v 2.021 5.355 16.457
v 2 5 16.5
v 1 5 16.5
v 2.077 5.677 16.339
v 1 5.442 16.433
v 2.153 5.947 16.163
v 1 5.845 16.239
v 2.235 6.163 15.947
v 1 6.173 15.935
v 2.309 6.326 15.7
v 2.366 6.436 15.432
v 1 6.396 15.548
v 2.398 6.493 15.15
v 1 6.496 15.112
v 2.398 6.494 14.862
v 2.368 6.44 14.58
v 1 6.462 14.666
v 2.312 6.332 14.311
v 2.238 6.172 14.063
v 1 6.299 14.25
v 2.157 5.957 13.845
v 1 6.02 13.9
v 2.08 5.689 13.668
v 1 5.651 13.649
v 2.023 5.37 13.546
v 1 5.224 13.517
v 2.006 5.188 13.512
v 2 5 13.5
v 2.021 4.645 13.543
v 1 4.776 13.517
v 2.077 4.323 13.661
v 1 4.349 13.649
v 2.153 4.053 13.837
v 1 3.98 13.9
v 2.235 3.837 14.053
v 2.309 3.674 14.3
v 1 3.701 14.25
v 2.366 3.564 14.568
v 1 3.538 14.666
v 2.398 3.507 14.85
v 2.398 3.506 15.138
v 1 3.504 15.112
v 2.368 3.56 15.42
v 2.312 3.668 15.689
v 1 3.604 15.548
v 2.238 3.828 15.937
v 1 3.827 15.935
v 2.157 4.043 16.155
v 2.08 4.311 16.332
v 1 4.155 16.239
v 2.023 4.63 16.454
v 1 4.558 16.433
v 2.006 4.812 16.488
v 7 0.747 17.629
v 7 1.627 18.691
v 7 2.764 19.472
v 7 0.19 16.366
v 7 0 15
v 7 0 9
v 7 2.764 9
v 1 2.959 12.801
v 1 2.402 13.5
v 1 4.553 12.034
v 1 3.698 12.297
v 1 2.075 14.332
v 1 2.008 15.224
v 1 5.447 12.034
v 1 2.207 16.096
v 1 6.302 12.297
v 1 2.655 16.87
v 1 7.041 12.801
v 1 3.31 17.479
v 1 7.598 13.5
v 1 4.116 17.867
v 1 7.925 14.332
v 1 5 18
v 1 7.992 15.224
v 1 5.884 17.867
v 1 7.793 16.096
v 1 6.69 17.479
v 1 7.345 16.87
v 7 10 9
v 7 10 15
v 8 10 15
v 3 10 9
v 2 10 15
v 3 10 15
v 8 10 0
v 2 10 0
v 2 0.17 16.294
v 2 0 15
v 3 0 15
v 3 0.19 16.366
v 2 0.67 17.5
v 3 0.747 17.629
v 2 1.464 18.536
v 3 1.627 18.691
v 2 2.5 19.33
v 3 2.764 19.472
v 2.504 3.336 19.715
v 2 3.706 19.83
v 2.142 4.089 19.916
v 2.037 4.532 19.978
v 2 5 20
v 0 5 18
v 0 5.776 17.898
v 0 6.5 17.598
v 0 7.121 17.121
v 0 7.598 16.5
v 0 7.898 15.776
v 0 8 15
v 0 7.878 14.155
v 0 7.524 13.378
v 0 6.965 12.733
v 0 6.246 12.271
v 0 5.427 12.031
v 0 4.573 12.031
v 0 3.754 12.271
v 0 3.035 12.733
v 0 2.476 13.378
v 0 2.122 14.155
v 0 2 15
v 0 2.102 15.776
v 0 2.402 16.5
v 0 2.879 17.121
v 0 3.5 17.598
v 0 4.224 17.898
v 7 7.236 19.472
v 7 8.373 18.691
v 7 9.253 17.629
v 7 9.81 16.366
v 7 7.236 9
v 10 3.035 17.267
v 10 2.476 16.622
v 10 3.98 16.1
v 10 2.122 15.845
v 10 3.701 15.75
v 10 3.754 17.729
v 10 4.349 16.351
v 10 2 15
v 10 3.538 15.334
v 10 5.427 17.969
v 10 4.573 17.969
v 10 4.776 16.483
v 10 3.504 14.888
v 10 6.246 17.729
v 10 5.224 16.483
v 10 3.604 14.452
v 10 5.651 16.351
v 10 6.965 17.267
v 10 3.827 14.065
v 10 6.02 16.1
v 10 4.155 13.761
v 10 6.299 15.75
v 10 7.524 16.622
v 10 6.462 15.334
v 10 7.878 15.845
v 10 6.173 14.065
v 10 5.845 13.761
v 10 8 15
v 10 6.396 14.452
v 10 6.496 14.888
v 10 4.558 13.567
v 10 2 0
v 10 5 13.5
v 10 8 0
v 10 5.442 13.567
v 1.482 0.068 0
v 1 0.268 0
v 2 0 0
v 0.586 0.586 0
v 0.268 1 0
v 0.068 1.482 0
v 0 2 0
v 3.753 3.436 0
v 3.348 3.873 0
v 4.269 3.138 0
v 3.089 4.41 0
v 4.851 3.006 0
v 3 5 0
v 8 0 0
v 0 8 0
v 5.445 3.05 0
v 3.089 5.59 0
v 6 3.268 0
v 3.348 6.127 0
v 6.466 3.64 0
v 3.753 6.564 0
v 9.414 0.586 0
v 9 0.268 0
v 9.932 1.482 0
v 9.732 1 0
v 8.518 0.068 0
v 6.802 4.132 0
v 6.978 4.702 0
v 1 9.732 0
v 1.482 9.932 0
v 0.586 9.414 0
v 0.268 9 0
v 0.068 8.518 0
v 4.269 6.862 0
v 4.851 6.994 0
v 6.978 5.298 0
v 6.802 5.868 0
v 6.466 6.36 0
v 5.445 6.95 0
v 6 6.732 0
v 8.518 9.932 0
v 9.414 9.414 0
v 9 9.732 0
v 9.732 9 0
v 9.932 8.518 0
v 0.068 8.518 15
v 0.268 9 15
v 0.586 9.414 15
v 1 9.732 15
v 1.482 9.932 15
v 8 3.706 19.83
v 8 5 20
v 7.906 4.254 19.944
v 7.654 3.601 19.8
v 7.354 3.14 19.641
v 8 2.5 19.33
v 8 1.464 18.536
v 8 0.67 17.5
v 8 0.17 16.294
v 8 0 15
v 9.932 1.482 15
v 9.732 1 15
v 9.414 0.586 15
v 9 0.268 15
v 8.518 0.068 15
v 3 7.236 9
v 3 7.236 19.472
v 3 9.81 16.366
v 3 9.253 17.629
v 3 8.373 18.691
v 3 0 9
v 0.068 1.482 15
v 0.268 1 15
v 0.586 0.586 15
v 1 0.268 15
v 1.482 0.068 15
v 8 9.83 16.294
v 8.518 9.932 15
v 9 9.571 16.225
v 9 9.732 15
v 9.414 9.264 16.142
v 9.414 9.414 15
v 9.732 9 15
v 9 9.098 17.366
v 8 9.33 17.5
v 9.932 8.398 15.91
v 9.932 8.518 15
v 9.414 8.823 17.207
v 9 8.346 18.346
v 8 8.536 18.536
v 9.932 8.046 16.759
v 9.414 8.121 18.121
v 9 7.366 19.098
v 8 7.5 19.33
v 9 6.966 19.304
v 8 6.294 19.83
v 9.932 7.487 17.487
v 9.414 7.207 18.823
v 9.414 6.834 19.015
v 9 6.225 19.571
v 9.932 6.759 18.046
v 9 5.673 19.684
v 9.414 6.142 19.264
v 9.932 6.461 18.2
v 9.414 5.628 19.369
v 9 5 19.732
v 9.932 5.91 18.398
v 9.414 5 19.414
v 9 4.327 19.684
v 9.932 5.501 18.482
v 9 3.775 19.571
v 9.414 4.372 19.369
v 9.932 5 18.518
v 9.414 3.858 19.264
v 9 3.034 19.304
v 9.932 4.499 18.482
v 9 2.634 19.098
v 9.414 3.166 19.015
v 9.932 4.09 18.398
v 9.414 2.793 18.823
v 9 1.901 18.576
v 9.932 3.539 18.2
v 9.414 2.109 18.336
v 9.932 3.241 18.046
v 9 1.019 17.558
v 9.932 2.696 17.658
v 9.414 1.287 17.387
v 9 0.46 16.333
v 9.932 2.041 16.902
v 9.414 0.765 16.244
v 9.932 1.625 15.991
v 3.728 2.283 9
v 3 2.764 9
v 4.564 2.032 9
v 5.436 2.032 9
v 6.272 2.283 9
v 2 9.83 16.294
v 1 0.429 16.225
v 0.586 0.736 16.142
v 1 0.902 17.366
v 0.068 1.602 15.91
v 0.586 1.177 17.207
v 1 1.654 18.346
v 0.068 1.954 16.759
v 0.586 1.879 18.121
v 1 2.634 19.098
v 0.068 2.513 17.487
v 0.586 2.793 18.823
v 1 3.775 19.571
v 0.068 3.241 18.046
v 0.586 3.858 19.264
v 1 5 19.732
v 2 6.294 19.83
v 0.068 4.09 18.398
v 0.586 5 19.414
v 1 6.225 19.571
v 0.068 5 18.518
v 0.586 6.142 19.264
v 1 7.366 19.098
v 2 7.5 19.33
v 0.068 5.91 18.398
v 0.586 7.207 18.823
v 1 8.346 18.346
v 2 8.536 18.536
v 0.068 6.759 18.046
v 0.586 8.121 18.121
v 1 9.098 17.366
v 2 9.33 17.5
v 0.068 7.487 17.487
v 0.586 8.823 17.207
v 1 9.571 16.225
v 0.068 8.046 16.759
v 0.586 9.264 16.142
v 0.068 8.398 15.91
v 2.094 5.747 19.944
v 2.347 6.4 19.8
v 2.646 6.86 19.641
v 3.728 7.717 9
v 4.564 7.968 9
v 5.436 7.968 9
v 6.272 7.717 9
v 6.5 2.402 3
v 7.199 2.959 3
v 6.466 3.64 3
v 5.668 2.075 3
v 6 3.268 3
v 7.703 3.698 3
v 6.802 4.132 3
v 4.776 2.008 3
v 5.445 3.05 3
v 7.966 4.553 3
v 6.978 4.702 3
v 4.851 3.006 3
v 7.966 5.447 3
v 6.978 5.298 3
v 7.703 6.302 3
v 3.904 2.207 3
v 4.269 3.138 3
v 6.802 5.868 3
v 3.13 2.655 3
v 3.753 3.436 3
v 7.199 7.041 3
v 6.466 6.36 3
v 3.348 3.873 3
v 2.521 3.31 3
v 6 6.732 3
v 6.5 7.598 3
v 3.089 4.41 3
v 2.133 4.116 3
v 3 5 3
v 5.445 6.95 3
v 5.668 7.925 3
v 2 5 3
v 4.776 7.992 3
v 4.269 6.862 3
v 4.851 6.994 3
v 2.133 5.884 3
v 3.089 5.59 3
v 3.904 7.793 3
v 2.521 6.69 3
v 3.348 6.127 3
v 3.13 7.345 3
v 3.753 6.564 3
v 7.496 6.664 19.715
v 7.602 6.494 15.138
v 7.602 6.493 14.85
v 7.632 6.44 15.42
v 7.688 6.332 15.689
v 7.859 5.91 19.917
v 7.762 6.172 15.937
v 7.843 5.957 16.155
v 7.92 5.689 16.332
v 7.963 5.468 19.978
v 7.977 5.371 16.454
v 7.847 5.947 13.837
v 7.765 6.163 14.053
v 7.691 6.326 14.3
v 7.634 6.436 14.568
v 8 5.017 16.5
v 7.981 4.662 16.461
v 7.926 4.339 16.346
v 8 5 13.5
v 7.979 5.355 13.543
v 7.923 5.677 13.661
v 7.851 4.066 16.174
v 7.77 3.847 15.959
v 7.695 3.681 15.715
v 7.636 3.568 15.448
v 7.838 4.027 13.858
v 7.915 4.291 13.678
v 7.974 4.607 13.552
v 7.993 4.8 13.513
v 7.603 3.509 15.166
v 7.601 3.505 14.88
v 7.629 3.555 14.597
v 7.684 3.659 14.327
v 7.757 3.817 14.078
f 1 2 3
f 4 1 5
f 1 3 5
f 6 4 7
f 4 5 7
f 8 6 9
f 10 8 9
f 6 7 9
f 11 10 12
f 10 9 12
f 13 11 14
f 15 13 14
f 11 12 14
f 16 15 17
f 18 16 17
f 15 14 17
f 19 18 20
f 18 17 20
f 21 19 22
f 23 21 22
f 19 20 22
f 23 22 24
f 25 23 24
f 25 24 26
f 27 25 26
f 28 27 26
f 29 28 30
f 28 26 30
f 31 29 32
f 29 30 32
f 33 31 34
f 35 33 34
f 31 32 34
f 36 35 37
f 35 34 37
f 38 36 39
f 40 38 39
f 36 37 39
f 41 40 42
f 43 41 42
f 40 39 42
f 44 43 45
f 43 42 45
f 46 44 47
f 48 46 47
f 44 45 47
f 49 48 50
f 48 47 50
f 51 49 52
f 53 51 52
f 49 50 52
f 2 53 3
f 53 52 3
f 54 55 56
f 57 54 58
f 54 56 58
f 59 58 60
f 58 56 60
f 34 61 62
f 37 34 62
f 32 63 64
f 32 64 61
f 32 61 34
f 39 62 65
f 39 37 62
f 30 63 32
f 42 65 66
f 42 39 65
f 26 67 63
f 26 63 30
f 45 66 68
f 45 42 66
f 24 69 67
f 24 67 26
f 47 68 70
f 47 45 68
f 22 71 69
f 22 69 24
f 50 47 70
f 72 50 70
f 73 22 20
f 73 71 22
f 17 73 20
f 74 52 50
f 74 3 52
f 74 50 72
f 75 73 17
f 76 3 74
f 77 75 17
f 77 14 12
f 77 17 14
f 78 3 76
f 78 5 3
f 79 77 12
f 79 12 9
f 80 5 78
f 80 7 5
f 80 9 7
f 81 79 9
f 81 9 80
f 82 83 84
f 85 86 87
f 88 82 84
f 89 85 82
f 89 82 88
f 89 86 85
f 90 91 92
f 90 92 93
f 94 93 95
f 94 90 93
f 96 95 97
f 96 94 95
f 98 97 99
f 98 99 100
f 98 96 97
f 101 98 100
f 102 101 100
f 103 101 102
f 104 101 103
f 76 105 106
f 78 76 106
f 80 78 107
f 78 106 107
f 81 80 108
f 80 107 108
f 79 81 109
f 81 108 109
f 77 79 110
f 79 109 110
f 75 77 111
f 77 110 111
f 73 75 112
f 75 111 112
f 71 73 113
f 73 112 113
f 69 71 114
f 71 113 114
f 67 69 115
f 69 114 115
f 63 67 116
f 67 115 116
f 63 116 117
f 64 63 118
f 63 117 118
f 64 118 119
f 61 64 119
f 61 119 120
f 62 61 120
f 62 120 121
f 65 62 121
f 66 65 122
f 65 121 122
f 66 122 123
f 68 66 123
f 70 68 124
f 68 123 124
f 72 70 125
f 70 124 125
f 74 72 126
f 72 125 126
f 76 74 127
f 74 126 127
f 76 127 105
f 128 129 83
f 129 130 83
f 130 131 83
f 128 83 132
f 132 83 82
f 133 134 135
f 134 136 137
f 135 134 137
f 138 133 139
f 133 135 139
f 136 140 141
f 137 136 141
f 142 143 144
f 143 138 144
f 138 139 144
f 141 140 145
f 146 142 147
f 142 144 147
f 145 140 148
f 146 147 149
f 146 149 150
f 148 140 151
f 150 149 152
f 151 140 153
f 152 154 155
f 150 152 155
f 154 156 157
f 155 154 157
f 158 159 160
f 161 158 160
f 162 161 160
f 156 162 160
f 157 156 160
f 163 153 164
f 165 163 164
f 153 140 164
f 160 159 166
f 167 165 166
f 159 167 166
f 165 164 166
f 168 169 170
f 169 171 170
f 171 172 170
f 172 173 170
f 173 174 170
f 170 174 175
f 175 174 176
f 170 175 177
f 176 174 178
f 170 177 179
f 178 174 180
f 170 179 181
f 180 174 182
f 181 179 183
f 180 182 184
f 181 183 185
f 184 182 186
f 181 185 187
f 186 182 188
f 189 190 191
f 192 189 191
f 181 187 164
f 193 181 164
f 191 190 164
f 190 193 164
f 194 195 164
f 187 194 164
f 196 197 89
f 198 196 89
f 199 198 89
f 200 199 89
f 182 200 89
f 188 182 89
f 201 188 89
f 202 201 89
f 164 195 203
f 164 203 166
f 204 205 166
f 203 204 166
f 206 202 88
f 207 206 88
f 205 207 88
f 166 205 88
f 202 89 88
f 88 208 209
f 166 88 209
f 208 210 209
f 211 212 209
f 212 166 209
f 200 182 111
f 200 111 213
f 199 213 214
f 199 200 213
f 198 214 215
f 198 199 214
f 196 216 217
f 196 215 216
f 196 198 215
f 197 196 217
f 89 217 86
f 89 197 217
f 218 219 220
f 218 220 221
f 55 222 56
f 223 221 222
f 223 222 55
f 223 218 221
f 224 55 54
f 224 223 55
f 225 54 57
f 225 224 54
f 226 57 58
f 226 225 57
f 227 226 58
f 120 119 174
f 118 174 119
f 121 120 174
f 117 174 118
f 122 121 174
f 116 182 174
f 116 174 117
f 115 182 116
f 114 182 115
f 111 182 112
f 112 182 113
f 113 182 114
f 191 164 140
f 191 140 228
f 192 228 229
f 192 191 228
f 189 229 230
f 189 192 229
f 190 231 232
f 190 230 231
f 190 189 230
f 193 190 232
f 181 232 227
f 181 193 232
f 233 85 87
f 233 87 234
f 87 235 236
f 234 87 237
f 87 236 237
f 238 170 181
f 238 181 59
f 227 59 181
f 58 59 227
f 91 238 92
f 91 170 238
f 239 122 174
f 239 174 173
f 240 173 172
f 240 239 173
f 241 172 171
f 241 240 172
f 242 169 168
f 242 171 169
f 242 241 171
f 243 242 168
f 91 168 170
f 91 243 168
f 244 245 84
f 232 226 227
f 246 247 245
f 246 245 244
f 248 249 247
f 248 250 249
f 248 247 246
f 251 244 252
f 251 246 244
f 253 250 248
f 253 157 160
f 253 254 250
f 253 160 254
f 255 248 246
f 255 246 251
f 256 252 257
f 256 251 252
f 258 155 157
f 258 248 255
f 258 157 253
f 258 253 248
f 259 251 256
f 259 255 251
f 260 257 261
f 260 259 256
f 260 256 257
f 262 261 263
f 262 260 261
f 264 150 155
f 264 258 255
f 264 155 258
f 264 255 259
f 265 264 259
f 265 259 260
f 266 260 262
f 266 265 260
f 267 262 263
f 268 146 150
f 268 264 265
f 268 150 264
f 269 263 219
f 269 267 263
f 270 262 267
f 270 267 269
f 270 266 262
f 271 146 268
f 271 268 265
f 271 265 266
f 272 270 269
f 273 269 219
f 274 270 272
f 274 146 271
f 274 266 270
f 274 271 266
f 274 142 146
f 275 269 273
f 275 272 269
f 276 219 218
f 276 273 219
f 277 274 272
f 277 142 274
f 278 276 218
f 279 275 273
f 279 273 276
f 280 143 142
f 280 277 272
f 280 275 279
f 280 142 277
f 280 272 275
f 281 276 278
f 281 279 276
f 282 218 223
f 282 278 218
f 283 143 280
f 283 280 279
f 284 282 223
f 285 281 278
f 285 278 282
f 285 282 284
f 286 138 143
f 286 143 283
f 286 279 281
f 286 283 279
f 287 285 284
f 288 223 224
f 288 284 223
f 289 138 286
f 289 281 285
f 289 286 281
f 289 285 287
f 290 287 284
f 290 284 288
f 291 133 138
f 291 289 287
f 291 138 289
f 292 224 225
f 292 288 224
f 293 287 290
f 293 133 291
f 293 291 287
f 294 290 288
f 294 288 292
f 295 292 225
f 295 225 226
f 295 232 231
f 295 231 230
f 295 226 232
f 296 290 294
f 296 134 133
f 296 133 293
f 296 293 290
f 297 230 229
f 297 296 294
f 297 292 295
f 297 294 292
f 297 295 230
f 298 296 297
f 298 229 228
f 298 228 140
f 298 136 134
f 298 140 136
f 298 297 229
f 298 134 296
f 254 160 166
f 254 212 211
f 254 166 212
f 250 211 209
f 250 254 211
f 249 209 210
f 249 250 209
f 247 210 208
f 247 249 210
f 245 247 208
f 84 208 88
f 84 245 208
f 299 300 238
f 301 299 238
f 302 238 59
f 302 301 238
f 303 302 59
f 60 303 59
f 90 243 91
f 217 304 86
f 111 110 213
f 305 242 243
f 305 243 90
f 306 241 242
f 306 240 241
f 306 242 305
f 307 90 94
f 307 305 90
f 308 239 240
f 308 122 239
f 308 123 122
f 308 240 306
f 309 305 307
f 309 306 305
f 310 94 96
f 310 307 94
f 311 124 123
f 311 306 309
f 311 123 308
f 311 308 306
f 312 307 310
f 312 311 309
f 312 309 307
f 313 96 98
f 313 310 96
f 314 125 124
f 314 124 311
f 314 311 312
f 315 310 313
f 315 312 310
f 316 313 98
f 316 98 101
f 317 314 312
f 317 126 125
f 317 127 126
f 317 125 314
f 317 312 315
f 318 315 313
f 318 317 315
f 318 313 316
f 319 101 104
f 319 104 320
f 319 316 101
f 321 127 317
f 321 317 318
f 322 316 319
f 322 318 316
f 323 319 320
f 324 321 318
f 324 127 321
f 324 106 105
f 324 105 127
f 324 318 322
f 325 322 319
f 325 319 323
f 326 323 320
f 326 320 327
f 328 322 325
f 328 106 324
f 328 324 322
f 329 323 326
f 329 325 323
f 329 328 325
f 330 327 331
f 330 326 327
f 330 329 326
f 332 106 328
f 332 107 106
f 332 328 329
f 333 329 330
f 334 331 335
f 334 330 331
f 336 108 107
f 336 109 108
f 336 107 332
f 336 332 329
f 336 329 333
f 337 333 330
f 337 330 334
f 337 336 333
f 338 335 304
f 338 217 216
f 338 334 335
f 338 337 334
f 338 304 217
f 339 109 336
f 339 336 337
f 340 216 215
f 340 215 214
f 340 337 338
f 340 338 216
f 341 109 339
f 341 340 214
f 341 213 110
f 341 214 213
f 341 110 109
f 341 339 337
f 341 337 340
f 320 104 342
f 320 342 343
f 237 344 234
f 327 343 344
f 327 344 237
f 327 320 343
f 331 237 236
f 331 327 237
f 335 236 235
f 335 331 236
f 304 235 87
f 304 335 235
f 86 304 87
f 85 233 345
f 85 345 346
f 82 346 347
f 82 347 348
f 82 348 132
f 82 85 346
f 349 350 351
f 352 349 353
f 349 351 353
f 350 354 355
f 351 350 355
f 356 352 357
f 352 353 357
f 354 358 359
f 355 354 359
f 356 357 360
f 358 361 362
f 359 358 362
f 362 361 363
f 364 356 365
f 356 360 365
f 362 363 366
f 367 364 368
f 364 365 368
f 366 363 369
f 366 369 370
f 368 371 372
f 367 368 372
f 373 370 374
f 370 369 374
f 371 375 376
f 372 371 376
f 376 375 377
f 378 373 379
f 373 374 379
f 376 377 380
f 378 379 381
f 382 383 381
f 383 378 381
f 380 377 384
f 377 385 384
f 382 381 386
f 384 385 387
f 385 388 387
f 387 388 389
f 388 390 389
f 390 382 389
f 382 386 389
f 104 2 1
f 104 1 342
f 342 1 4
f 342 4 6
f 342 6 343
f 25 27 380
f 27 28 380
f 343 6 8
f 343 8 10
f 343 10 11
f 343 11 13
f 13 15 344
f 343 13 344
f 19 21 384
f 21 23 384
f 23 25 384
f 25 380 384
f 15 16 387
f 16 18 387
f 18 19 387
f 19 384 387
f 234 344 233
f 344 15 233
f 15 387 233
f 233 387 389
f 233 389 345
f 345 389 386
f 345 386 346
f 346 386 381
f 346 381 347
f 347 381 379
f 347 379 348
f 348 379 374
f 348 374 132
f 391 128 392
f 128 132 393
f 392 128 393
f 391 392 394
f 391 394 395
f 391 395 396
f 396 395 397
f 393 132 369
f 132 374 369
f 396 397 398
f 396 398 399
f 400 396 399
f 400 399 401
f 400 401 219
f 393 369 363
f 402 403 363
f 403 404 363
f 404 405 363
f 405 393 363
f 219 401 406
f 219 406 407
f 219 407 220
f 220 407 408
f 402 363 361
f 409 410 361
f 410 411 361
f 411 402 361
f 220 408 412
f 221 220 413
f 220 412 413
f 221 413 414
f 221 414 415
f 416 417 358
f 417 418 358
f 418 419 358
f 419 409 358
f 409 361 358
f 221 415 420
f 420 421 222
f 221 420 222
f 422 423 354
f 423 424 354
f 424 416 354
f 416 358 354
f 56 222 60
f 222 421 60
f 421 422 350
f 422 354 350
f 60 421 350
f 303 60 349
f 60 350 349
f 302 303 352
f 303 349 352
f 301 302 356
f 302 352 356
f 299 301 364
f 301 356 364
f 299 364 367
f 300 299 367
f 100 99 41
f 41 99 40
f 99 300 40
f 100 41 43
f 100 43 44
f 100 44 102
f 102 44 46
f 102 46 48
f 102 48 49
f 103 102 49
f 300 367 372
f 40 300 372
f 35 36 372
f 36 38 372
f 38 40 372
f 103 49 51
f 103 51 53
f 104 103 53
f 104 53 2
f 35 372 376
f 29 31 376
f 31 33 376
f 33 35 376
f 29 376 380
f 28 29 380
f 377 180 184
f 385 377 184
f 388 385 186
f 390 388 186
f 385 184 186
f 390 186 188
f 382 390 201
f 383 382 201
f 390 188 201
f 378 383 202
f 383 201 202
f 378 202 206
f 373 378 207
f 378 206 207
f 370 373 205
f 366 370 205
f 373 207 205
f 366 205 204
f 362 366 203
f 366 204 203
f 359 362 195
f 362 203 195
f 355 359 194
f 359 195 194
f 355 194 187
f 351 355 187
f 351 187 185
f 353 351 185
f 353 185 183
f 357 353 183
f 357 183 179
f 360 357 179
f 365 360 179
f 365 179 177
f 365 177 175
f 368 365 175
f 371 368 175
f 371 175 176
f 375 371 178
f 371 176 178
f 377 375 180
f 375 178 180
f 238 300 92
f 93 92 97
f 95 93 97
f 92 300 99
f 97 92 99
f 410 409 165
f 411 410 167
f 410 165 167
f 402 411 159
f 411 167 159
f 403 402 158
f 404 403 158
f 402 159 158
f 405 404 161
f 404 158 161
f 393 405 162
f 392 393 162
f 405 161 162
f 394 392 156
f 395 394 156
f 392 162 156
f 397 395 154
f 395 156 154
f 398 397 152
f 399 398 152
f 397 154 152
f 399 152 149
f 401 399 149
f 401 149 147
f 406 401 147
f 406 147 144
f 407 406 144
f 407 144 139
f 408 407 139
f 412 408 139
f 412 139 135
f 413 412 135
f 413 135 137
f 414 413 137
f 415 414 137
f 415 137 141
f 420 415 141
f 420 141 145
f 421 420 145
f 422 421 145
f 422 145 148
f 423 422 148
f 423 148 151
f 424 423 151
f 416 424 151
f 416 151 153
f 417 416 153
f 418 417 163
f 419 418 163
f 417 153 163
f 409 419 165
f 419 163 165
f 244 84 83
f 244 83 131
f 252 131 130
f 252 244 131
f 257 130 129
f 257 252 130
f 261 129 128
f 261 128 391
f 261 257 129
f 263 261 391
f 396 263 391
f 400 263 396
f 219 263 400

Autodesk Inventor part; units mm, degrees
ref_plane "YZ Plane" through (0, 0, 0) normal (1, 0, 0) x (0, 1, 0)
ref_plane "XZ Plane" through (0, 0, 0) normal (0, 1, 0) x (-1, 0, 0)
sketch "Sketch1" plane through (0, 0, 0) normal (0, 0, 1) x (1, 0, 0)
  line L0 (0, 0) -> (10, 0)
  line L1 (10, 0) -> (10, 10)
  line L2 (10, 10) -> (0, 10)
  line L3 (0, 10) -> (0, 0)
  dimension "d0" = 10
  dimension "d1" = 10
extrude "Extrusion1" add sketch "Sketch1" along normal blind 9
sketch "Sketch2" plane through (10, 0, 0) normal (1, 0, 0) x (0, 0, -1)
  circle A0 centre (-15, 5) radius 5 construction
  line L0 (0, 0) -> (0, 10) projected
  arc A1 (-15, 10) -> (-15, 0) centre (-15, 5) ccw
  line L1 (-9, 0) -> (-9, 10) projected
  line L2 (-15, 10) -> (-9, 10)
  line L3 (-15, 0) -> (-9, 0)
  circle A2 centre (-15, 5) radius 1.5
  point P0 (0, 5)
  dimension "d4" = 10
  dimension "d5" = 15
  dimension "d6" = 3
extrude "Extrusion2" add sketch "Sketch2" against normal blind 3
sketch "Sketch3" plane through (0, 0, 0) normal (-1, 0, 0) x (0, 0, 1)
  circle A0 centre (15, 5) radius 1.5 projected
  arc A1 (15, 0) -> (15, 10) centre (15, 5) ccw projected
  line L0 (15, 10) -> (9, 10) projected
  line L1 (9, 0) -> (9, 10) projected
  line L2 (9, 0) -> (15, 0) projected
  point P0 (0, 0)
extrude "Extrusion3" add sketch "Sketch3" against normal blind 3
fillet "Fillet1" radius 2 6 edges at (0, 5, 20) (0, 0, 7.5) (0, 10, 7.5) (10, 5, 20) (10, 0, 7.5) (10, 10, 7.5)
sketch "Sketch4" plane through (0, 0, 0) normal (0, 0, -1) x (-1, 0, 0)
  circle A0 centre (-5, 5) radius 2
  line L0 (-8, 10) -> (-2, 10) projected
  line L1 (0, 8) -> (0, 2) projected
  point P0 (0, 0)
  point P1 (-5, 10)
  point P2 (0, 5)
  dimension "d12" = 4
extrude "Extrusion4" cut sketch "Sketch4" against normal through all
ref_plane "Work Plane1" through (0, 0, 3) normal (0, 0, -1) x (-1, 0, 0)
sketch "Sketch5" plane through (0, 0, 3) normal (0, 0, -1) x (-1, 0, 0)
  circle A0 centre (-5, 5) radius 2 projected
  circle A1 centre (-5, 5) radius 3
  point P0 (0, 0)
  dimension "d16" = 6
extrude "Extrusion5" cut sketch "Sketch5" against normal through all
sketch "Sketch8" plane through (0, 2, 0) normal (-1, 0, 0) x (0, 0, 1)
  circle A0 centre (15, 3) radius 1.5 projected
  circle A1 centre (15, 3) radius 3
  point P0 (0, -2)
  dimension "d20" = 6
extrude "Extrusion6" cut sketch "Sketch8" against normal blind 1
properties part number "Arm3" material "ABS Plastic"
